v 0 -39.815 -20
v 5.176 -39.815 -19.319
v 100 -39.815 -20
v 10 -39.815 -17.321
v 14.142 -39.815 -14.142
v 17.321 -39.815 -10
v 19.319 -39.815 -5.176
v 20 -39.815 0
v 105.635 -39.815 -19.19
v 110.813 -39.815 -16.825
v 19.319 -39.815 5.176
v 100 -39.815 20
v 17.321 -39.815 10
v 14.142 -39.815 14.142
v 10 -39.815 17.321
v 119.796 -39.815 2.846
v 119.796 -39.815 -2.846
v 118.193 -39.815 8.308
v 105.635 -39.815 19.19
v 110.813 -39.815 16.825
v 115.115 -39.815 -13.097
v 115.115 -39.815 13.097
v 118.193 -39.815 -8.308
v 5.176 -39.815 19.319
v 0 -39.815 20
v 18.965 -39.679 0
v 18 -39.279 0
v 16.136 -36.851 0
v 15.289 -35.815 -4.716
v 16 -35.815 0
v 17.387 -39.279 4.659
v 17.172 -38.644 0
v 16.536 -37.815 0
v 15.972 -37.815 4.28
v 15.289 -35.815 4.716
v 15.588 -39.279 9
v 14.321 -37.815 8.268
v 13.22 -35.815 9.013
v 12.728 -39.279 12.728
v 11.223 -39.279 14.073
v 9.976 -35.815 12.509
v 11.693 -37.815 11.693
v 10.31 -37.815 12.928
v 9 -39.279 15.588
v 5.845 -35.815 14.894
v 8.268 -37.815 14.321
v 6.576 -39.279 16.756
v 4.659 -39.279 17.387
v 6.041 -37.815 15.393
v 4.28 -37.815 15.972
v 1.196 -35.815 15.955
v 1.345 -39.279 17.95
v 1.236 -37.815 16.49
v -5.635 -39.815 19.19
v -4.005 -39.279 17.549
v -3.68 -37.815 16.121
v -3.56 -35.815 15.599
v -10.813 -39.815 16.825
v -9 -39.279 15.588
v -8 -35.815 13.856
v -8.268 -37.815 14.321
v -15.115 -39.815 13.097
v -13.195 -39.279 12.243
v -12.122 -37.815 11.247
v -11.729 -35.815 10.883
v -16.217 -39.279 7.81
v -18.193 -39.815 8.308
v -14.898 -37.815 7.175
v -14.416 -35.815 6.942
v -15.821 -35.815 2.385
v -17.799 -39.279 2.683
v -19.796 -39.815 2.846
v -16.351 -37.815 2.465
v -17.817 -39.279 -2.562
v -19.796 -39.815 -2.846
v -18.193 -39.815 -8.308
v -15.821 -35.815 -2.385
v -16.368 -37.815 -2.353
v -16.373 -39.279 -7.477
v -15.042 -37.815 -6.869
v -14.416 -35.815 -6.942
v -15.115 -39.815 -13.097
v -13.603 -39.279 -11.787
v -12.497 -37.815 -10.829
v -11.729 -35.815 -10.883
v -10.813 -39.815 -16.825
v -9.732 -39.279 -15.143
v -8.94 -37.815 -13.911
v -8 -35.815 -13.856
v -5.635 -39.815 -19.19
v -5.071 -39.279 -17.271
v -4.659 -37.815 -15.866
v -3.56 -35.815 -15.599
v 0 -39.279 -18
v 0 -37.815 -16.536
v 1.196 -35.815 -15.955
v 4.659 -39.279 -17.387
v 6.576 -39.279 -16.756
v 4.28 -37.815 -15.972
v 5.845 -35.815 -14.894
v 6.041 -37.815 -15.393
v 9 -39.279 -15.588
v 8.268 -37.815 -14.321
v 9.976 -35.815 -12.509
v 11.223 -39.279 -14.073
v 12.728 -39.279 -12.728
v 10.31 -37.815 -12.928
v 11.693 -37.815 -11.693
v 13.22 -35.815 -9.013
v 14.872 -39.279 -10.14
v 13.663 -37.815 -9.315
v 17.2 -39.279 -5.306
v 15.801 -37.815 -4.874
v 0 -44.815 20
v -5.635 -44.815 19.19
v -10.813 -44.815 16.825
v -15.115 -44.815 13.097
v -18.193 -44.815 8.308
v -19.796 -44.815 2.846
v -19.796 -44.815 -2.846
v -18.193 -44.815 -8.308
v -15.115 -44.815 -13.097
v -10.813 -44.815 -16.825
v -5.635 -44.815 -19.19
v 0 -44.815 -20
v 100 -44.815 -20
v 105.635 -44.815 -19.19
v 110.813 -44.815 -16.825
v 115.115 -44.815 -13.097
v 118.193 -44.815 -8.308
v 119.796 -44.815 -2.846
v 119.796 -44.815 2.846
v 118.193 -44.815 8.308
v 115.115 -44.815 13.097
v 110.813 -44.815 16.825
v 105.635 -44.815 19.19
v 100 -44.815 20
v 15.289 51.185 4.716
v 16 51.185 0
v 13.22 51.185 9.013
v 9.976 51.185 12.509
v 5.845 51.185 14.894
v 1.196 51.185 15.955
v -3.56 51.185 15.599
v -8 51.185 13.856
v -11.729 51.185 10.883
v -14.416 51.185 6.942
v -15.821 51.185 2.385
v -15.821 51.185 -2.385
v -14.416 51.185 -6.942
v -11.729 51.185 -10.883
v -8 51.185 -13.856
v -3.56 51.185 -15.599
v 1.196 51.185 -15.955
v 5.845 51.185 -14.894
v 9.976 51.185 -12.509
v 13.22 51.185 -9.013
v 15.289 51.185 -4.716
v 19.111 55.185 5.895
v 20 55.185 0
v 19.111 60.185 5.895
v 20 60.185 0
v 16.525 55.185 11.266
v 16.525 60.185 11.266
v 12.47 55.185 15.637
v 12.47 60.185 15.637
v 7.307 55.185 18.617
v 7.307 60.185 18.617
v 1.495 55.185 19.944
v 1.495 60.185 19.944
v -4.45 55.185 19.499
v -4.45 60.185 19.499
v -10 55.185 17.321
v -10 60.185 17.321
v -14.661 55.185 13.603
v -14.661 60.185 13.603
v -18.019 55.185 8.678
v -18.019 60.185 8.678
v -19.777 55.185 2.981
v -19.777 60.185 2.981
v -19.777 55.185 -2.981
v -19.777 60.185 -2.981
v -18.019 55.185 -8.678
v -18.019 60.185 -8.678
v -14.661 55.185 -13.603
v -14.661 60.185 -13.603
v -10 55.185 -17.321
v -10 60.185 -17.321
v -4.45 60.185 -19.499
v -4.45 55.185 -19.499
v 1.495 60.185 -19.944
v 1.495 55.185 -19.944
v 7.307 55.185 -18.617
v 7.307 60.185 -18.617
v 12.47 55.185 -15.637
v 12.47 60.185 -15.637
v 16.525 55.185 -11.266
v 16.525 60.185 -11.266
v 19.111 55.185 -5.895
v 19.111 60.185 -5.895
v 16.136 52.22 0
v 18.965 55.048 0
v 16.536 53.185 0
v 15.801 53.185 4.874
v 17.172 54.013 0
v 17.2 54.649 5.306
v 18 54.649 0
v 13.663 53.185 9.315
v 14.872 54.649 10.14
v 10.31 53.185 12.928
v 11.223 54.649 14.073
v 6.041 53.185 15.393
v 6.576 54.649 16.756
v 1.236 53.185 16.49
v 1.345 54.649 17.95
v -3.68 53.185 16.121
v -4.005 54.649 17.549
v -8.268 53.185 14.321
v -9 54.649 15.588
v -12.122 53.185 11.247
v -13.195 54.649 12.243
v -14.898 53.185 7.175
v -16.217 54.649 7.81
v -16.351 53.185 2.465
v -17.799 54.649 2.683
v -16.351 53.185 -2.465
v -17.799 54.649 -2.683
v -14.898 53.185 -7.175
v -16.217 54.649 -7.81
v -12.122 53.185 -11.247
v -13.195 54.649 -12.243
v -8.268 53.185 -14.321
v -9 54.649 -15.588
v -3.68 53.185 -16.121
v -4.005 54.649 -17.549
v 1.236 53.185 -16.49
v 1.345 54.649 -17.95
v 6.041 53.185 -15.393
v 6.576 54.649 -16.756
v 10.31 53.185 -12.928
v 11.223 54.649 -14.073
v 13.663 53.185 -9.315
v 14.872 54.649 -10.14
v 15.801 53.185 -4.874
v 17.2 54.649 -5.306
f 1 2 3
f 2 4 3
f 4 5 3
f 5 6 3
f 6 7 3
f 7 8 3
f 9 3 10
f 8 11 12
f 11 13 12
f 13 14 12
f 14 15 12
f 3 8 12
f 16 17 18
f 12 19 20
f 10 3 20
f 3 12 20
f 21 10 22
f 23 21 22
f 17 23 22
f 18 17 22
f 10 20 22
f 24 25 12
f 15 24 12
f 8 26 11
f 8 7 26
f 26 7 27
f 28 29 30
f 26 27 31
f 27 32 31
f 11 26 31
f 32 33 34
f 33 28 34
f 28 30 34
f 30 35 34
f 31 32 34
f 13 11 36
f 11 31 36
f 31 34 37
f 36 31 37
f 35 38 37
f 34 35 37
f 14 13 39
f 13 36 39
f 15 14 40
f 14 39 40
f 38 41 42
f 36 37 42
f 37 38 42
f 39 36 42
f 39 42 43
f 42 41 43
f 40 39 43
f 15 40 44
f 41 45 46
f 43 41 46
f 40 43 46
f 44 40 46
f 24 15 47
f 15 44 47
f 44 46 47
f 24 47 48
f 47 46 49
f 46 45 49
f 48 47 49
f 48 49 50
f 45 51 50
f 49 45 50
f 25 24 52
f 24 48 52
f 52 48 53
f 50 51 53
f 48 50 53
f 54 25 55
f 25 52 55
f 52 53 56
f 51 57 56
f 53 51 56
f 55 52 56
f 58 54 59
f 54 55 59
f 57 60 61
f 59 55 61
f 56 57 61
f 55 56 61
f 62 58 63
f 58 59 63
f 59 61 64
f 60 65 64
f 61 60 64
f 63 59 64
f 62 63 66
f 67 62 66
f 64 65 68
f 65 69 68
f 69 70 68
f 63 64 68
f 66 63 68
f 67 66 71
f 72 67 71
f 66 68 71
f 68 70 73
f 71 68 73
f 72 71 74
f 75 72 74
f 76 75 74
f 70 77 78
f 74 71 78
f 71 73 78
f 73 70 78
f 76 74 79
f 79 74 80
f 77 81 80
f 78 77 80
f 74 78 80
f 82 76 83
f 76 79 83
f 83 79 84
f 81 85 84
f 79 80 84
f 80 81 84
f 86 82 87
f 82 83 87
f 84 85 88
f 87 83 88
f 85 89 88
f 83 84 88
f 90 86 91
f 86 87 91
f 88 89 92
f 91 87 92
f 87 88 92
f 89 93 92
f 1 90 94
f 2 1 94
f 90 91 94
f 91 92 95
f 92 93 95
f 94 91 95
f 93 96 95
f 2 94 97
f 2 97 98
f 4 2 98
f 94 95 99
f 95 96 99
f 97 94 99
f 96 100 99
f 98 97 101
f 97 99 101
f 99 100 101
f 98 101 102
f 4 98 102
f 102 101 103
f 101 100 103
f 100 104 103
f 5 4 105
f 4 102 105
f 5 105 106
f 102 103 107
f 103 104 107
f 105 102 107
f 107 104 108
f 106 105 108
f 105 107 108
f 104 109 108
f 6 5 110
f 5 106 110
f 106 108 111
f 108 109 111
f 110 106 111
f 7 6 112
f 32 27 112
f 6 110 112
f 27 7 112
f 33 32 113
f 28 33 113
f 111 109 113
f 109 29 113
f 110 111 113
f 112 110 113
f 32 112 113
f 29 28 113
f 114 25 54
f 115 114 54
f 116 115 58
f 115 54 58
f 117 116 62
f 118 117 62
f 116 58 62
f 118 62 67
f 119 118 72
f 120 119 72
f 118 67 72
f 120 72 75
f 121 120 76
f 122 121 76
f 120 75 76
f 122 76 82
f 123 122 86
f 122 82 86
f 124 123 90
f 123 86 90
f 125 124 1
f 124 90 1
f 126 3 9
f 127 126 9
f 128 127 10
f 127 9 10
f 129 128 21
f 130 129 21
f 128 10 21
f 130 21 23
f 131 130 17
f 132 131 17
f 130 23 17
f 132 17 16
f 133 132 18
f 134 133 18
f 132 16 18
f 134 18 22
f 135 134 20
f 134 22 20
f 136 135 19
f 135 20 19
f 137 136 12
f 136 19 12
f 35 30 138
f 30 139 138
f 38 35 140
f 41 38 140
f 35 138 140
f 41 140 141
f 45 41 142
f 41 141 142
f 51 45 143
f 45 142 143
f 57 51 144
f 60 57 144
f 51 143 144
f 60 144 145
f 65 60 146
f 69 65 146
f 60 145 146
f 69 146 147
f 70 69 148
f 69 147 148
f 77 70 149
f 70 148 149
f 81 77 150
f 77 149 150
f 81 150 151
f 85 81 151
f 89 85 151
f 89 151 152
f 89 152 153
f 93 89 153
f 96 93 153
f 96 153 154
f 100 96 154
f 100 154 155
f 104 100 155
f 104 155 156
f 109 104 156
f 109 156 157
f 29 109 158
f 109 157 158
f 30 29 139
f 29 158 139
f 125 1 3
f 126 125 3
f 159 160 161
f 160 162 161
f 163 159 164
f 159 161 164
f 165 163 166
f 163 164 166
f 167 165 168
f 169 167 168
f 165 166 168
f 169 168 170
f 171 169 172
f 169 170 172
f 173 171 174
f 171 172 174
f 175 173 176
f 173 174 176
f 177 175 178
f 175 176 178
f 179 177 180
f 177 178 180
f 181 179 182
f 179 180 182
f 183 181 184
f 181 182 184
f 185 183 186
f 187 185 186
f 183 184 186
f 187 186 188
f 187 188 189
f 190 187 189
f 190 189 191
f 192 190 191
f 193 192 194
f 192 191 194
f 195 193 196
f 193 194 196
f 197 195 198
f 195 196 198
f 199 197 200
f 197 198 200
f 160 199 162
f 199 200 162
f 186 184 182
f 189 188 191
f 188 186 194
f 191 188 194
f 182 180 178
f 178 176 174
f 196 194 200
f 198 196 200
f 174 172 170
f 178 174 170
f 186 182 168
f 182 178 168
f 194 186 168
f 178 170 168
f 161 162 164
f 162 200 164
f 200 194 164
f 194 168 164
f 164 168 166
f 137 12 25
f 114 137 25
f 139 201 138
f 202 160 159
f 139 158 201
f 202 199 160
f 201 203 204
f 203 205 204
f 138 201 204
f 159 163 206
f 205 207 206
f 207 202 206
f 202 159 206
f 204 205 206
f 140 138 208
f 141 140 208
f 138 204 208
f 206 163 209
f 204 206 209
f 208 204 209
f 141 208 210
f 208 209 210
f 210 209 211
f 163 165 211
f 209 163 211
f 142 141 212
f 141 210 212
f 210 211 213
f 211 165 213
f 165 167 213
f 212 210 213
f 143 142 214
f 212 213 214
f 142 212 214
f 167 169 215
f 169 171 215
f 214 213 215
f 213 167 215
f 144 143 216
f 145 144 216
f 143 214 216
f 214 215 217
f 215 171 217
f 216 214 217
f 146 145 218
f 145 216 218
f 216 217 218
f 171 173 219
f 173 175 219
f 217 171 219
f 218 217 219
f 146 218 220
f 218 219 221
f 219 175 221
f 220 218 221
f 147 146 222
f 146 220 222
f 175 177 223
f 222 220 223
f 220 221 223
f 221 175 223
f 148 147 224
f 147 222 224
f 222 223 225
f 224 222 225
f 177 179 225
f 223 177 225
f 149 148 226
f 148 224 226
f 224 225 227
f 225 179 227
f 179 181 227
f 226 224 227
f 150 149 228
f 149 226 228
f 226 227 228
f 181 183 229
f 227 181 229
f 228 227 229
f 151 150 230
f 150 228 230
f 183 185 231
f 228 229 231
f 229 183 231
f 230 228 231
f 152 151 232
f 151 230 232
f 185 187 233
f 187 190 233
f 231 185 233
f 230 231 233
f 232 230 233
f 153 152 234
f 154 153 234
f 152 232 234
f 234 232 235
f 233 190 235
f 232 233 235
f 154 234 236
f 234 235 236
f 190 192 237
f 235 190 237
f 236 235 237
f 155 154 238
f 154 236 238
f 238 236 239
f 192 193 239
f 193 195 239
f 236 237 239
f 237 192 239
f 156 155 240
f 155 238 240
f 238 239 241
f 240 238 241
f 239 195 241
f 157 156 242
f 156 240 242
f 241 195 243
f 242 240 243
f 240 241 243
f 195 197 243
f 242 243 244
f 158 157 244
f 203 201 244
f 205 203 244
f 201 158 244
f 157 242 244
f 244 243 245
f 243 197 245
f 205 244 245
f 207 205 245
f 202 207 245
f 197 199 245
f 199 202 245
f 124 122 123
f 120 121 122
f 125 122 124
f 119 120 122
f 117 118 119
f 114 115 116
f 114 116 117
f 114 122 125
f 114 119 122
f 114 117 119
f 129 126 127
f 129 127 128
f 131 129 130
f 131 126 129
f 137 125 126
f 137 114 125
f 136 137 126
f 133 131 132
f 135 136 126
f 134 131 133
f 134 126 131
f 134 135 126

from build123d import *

# Parameters (mm, degrees)
EXTRUDE_1_DEPTH = 5


with BuildPart() as part:
    # 草图1 → 旋转1 (revolve)
    with BuildSketch(Plane.XY):
        with BuildLine():
            Line((0, 60.184685033), (0, -39.815314967))
            Line((0, -39.815314967), (20, -39.815314967))
            ThreePointArc((20, -39.815314967), (17.171572875, -38.643742092), (16, -35.815314967))
            Line((16, -35.815314967), (16, 51.184685033))
            ThreePointArc((16, 51.184685033), (17.171572875, 54.013112157), (20, 55.184685033))
            Line((20, 55.184685033), (20, 60.184685033))
            Line((20, 60.184685033), (0, 60.184685033))
        make_face()
    revolve(axis=Axis((0, 60.184685033, 0), (0, -1, 0)))

    # 草图2 → 凸台-拉伸1 (add)
    with BuildSketch(Plane.XZ.offset(39.815314967)):
        with BuildLine():
            Line((0, -20), (100, -20))
            ThreePointArc((100, -20), (120, 0), (100, 20))
            Line((100, 20), (0, 20))
            ThreePointArc((0, 20), (-20, 0), (0, -20))
        make_face()
    extrude(amount=EXTRUDE_1_DEPTH)


solid = part.part
